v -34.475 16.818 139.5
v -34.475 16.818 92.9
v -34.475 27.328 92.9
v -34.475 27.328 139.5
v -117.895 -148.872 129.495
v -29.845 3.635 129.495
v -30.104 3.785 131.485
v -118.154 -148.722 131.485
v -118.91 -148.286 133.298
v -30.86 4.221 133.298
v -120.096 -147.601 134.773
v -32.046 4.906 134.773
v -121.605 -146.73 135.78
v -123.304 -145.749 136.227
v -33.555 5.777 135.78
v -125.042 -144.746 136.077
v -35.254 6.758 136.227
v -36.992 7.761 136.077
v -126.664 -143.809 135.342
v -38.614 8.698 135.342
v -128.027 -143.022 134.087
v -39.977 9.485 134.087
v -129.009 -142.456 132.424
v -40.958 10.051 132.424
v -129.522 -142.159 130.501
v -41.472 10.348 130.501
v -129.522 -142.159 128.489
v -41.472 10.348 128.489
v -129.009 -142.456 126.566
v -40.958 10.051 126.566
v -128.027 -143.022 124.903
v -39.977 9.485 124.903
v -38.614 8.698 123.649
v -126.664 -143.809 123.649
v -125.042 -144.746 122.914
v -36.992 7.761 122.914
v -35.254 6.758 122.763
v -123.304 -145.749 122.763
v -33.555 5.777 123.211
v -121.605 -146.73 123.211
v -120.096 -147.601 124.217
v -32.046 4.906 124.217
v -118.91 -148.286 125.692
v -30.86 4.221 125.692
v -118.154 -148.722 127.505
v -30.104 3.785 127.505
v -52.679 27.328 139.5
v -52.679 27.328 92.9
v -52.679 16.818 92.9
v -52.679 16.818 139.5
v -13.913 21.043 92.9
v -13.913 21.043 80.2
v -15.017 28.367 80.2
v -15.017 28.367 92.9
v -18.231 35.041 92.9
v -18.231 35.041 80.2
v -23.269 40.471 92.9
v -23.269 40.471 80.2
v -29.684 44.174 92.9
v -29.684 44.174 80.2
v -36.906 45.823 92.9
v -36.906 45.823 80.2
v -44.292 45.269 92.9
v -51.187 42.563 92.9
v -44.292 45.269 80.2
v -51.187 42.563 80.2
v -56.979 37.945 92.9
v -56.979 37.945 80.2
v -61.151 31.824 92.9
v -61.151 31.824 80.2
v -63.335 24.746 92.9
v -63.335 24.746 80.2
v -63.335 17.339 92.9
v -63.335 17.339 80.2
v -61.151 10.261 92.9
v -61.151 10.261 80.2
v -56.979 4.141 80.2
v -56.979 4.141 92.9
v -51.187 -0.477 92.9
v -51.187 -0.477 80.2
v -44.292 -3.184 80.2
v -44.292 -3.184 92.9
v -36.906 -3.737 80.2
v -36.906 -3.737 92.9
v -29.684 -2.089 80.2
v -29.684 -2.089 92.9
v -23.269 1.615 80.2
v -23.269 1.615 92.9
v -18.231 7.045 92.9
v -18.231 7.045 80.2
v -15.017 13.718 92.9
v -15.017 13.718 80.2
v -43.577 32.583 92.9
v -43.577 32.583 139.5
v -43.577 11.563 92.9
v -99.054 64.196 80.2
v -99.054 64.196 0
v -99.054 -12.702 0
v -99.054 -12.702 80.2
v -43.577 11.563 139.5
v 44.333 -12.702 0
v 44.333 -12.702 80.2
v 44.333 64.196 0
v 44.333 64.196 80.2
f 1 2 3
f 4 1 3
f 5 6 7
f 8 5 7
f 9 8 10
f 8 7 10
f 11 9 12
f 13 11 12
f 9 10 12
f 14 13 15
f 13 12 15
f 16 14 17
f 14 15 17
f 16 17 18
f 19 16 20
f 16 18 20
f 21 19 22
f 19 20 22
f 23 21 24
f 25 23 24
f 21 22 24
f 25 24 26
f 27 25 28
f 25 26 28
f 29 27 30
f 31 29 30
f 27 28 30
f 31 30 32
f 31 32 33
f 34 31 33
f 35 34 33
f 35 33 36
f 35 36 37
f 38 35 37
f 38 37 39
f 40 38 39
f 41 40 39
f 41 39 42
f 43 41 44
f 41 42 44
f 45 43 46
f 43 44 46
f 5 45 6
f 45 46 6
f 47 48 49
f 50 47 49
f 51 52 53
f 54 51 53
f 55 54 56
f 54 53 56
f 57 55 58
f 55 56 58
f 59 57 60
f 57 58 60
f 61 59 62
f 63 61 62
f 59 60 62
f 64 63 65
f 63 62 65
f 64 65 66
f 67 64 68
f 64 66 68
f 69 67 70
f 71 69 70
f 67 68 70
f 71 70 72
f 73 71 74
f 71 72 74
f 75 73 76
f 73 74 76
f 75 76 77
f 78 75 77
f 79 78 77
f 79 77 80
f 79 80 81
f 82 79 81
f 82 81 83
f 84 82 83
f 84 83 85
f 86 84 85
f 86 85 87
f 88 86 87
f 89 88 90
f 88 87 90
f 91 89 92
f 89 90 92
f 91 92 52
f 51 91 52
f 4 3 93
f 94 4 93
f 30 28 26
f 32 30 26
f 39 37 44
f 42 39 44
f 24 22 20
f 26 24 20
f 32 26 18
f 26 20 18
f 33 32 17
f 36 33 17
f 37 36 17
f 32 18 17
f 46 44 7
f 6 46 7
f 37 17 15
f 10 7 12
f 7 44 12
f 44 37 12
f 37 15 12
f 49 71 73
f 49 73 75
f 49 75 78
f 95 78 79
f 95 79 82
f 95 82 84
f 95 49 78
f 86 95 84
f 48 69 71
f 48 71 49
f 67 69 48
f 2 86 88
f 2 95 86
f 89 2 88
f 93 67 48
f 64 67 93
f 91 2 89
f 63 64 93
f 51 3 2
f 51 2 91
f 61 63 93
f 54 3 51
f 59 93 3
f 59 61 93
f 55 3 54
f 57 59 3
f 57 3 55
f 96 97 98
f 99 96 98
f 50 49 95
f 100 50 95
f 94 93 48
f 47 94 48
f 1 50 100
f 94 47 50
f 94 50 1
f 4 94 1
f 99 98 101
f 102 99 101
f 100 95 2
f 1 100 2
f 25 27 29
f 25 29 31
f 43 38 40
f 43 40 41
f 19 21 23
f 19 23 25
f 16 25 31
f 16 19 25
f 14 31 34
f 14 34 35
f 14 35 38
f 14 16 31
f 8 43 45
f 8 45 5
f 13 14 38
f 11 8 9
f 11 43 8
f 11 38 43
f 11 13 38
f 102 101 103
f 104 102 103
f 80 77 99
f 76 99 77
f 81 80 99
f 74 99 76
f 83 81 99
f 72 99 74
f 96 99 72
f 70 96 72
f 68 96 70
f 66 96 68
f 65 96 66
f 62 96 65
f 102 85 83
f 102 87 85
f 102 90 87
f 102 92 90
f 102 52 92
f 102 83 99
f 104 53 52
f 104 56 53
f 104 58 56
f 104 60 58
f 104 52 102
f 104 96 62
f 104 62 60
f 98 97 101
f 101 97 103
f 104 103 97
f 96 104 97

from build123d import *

# Parameters (mm, degrees)
F1_DEPTH = 80.2
F2_R     = 24.849366
F3_DEPTH = 12.7
F5_DEPTH = 46.6
F6_R     = 6.750906
F7_DEPTH = 176.1


with BuildPart() as f1:
    # F0 (on Top) → F1 (new body)
    with BuildSketch(Plane.XY):
        Polygon((44.33316, 64.195812), (-64.956053, 64.195812), (29.79269, -12.702078), (44.33316, -12.702078), align=None)
        Polygon((29.79269, -12.702078), (-64.956053, 64.195812), (-99.054046, 64.195812), (-99.054046, -12.702078), align=None)
    extrude(amount=F1_DEPTH)

    # F2 (on face) → F3 (join)
    with BuildSketch(Plane.XY.offset(80.2)):
        with Locations((-38.762782, 21.042721)):
            Circle(F2_R)
    extrude(amount=F3_DEPTH)

    # F4 (on face) → F5 (join)
    with BuildSketch(Plane.XY.offset(92.9)):
        Polygon((-34.475114, 16.818366), (-34.475114, 27.328422), (-43.57709, 32.58345), (-52.679066, 27.328422), (-52.679066, 16.818366), (-43.57709, 11.563337), align=None)
    extrude(amount=F5_DEPTH)


with BuildPart() as f7:
    # F6 (on face) → F7 (new body)
    with BuildSketch(Plane(origin=(-5.8872, -10.19693, 0), x_dir=(0.866025, -0.5, 0), z_dir=(-0.5, -0.866025, 0))):
        with Locations((-34.414481, 129.495263)):
            Circle(F6_R)
    extrude(amount=F7_DEPTH)


solid = Compound([f1.part, f7.part])
